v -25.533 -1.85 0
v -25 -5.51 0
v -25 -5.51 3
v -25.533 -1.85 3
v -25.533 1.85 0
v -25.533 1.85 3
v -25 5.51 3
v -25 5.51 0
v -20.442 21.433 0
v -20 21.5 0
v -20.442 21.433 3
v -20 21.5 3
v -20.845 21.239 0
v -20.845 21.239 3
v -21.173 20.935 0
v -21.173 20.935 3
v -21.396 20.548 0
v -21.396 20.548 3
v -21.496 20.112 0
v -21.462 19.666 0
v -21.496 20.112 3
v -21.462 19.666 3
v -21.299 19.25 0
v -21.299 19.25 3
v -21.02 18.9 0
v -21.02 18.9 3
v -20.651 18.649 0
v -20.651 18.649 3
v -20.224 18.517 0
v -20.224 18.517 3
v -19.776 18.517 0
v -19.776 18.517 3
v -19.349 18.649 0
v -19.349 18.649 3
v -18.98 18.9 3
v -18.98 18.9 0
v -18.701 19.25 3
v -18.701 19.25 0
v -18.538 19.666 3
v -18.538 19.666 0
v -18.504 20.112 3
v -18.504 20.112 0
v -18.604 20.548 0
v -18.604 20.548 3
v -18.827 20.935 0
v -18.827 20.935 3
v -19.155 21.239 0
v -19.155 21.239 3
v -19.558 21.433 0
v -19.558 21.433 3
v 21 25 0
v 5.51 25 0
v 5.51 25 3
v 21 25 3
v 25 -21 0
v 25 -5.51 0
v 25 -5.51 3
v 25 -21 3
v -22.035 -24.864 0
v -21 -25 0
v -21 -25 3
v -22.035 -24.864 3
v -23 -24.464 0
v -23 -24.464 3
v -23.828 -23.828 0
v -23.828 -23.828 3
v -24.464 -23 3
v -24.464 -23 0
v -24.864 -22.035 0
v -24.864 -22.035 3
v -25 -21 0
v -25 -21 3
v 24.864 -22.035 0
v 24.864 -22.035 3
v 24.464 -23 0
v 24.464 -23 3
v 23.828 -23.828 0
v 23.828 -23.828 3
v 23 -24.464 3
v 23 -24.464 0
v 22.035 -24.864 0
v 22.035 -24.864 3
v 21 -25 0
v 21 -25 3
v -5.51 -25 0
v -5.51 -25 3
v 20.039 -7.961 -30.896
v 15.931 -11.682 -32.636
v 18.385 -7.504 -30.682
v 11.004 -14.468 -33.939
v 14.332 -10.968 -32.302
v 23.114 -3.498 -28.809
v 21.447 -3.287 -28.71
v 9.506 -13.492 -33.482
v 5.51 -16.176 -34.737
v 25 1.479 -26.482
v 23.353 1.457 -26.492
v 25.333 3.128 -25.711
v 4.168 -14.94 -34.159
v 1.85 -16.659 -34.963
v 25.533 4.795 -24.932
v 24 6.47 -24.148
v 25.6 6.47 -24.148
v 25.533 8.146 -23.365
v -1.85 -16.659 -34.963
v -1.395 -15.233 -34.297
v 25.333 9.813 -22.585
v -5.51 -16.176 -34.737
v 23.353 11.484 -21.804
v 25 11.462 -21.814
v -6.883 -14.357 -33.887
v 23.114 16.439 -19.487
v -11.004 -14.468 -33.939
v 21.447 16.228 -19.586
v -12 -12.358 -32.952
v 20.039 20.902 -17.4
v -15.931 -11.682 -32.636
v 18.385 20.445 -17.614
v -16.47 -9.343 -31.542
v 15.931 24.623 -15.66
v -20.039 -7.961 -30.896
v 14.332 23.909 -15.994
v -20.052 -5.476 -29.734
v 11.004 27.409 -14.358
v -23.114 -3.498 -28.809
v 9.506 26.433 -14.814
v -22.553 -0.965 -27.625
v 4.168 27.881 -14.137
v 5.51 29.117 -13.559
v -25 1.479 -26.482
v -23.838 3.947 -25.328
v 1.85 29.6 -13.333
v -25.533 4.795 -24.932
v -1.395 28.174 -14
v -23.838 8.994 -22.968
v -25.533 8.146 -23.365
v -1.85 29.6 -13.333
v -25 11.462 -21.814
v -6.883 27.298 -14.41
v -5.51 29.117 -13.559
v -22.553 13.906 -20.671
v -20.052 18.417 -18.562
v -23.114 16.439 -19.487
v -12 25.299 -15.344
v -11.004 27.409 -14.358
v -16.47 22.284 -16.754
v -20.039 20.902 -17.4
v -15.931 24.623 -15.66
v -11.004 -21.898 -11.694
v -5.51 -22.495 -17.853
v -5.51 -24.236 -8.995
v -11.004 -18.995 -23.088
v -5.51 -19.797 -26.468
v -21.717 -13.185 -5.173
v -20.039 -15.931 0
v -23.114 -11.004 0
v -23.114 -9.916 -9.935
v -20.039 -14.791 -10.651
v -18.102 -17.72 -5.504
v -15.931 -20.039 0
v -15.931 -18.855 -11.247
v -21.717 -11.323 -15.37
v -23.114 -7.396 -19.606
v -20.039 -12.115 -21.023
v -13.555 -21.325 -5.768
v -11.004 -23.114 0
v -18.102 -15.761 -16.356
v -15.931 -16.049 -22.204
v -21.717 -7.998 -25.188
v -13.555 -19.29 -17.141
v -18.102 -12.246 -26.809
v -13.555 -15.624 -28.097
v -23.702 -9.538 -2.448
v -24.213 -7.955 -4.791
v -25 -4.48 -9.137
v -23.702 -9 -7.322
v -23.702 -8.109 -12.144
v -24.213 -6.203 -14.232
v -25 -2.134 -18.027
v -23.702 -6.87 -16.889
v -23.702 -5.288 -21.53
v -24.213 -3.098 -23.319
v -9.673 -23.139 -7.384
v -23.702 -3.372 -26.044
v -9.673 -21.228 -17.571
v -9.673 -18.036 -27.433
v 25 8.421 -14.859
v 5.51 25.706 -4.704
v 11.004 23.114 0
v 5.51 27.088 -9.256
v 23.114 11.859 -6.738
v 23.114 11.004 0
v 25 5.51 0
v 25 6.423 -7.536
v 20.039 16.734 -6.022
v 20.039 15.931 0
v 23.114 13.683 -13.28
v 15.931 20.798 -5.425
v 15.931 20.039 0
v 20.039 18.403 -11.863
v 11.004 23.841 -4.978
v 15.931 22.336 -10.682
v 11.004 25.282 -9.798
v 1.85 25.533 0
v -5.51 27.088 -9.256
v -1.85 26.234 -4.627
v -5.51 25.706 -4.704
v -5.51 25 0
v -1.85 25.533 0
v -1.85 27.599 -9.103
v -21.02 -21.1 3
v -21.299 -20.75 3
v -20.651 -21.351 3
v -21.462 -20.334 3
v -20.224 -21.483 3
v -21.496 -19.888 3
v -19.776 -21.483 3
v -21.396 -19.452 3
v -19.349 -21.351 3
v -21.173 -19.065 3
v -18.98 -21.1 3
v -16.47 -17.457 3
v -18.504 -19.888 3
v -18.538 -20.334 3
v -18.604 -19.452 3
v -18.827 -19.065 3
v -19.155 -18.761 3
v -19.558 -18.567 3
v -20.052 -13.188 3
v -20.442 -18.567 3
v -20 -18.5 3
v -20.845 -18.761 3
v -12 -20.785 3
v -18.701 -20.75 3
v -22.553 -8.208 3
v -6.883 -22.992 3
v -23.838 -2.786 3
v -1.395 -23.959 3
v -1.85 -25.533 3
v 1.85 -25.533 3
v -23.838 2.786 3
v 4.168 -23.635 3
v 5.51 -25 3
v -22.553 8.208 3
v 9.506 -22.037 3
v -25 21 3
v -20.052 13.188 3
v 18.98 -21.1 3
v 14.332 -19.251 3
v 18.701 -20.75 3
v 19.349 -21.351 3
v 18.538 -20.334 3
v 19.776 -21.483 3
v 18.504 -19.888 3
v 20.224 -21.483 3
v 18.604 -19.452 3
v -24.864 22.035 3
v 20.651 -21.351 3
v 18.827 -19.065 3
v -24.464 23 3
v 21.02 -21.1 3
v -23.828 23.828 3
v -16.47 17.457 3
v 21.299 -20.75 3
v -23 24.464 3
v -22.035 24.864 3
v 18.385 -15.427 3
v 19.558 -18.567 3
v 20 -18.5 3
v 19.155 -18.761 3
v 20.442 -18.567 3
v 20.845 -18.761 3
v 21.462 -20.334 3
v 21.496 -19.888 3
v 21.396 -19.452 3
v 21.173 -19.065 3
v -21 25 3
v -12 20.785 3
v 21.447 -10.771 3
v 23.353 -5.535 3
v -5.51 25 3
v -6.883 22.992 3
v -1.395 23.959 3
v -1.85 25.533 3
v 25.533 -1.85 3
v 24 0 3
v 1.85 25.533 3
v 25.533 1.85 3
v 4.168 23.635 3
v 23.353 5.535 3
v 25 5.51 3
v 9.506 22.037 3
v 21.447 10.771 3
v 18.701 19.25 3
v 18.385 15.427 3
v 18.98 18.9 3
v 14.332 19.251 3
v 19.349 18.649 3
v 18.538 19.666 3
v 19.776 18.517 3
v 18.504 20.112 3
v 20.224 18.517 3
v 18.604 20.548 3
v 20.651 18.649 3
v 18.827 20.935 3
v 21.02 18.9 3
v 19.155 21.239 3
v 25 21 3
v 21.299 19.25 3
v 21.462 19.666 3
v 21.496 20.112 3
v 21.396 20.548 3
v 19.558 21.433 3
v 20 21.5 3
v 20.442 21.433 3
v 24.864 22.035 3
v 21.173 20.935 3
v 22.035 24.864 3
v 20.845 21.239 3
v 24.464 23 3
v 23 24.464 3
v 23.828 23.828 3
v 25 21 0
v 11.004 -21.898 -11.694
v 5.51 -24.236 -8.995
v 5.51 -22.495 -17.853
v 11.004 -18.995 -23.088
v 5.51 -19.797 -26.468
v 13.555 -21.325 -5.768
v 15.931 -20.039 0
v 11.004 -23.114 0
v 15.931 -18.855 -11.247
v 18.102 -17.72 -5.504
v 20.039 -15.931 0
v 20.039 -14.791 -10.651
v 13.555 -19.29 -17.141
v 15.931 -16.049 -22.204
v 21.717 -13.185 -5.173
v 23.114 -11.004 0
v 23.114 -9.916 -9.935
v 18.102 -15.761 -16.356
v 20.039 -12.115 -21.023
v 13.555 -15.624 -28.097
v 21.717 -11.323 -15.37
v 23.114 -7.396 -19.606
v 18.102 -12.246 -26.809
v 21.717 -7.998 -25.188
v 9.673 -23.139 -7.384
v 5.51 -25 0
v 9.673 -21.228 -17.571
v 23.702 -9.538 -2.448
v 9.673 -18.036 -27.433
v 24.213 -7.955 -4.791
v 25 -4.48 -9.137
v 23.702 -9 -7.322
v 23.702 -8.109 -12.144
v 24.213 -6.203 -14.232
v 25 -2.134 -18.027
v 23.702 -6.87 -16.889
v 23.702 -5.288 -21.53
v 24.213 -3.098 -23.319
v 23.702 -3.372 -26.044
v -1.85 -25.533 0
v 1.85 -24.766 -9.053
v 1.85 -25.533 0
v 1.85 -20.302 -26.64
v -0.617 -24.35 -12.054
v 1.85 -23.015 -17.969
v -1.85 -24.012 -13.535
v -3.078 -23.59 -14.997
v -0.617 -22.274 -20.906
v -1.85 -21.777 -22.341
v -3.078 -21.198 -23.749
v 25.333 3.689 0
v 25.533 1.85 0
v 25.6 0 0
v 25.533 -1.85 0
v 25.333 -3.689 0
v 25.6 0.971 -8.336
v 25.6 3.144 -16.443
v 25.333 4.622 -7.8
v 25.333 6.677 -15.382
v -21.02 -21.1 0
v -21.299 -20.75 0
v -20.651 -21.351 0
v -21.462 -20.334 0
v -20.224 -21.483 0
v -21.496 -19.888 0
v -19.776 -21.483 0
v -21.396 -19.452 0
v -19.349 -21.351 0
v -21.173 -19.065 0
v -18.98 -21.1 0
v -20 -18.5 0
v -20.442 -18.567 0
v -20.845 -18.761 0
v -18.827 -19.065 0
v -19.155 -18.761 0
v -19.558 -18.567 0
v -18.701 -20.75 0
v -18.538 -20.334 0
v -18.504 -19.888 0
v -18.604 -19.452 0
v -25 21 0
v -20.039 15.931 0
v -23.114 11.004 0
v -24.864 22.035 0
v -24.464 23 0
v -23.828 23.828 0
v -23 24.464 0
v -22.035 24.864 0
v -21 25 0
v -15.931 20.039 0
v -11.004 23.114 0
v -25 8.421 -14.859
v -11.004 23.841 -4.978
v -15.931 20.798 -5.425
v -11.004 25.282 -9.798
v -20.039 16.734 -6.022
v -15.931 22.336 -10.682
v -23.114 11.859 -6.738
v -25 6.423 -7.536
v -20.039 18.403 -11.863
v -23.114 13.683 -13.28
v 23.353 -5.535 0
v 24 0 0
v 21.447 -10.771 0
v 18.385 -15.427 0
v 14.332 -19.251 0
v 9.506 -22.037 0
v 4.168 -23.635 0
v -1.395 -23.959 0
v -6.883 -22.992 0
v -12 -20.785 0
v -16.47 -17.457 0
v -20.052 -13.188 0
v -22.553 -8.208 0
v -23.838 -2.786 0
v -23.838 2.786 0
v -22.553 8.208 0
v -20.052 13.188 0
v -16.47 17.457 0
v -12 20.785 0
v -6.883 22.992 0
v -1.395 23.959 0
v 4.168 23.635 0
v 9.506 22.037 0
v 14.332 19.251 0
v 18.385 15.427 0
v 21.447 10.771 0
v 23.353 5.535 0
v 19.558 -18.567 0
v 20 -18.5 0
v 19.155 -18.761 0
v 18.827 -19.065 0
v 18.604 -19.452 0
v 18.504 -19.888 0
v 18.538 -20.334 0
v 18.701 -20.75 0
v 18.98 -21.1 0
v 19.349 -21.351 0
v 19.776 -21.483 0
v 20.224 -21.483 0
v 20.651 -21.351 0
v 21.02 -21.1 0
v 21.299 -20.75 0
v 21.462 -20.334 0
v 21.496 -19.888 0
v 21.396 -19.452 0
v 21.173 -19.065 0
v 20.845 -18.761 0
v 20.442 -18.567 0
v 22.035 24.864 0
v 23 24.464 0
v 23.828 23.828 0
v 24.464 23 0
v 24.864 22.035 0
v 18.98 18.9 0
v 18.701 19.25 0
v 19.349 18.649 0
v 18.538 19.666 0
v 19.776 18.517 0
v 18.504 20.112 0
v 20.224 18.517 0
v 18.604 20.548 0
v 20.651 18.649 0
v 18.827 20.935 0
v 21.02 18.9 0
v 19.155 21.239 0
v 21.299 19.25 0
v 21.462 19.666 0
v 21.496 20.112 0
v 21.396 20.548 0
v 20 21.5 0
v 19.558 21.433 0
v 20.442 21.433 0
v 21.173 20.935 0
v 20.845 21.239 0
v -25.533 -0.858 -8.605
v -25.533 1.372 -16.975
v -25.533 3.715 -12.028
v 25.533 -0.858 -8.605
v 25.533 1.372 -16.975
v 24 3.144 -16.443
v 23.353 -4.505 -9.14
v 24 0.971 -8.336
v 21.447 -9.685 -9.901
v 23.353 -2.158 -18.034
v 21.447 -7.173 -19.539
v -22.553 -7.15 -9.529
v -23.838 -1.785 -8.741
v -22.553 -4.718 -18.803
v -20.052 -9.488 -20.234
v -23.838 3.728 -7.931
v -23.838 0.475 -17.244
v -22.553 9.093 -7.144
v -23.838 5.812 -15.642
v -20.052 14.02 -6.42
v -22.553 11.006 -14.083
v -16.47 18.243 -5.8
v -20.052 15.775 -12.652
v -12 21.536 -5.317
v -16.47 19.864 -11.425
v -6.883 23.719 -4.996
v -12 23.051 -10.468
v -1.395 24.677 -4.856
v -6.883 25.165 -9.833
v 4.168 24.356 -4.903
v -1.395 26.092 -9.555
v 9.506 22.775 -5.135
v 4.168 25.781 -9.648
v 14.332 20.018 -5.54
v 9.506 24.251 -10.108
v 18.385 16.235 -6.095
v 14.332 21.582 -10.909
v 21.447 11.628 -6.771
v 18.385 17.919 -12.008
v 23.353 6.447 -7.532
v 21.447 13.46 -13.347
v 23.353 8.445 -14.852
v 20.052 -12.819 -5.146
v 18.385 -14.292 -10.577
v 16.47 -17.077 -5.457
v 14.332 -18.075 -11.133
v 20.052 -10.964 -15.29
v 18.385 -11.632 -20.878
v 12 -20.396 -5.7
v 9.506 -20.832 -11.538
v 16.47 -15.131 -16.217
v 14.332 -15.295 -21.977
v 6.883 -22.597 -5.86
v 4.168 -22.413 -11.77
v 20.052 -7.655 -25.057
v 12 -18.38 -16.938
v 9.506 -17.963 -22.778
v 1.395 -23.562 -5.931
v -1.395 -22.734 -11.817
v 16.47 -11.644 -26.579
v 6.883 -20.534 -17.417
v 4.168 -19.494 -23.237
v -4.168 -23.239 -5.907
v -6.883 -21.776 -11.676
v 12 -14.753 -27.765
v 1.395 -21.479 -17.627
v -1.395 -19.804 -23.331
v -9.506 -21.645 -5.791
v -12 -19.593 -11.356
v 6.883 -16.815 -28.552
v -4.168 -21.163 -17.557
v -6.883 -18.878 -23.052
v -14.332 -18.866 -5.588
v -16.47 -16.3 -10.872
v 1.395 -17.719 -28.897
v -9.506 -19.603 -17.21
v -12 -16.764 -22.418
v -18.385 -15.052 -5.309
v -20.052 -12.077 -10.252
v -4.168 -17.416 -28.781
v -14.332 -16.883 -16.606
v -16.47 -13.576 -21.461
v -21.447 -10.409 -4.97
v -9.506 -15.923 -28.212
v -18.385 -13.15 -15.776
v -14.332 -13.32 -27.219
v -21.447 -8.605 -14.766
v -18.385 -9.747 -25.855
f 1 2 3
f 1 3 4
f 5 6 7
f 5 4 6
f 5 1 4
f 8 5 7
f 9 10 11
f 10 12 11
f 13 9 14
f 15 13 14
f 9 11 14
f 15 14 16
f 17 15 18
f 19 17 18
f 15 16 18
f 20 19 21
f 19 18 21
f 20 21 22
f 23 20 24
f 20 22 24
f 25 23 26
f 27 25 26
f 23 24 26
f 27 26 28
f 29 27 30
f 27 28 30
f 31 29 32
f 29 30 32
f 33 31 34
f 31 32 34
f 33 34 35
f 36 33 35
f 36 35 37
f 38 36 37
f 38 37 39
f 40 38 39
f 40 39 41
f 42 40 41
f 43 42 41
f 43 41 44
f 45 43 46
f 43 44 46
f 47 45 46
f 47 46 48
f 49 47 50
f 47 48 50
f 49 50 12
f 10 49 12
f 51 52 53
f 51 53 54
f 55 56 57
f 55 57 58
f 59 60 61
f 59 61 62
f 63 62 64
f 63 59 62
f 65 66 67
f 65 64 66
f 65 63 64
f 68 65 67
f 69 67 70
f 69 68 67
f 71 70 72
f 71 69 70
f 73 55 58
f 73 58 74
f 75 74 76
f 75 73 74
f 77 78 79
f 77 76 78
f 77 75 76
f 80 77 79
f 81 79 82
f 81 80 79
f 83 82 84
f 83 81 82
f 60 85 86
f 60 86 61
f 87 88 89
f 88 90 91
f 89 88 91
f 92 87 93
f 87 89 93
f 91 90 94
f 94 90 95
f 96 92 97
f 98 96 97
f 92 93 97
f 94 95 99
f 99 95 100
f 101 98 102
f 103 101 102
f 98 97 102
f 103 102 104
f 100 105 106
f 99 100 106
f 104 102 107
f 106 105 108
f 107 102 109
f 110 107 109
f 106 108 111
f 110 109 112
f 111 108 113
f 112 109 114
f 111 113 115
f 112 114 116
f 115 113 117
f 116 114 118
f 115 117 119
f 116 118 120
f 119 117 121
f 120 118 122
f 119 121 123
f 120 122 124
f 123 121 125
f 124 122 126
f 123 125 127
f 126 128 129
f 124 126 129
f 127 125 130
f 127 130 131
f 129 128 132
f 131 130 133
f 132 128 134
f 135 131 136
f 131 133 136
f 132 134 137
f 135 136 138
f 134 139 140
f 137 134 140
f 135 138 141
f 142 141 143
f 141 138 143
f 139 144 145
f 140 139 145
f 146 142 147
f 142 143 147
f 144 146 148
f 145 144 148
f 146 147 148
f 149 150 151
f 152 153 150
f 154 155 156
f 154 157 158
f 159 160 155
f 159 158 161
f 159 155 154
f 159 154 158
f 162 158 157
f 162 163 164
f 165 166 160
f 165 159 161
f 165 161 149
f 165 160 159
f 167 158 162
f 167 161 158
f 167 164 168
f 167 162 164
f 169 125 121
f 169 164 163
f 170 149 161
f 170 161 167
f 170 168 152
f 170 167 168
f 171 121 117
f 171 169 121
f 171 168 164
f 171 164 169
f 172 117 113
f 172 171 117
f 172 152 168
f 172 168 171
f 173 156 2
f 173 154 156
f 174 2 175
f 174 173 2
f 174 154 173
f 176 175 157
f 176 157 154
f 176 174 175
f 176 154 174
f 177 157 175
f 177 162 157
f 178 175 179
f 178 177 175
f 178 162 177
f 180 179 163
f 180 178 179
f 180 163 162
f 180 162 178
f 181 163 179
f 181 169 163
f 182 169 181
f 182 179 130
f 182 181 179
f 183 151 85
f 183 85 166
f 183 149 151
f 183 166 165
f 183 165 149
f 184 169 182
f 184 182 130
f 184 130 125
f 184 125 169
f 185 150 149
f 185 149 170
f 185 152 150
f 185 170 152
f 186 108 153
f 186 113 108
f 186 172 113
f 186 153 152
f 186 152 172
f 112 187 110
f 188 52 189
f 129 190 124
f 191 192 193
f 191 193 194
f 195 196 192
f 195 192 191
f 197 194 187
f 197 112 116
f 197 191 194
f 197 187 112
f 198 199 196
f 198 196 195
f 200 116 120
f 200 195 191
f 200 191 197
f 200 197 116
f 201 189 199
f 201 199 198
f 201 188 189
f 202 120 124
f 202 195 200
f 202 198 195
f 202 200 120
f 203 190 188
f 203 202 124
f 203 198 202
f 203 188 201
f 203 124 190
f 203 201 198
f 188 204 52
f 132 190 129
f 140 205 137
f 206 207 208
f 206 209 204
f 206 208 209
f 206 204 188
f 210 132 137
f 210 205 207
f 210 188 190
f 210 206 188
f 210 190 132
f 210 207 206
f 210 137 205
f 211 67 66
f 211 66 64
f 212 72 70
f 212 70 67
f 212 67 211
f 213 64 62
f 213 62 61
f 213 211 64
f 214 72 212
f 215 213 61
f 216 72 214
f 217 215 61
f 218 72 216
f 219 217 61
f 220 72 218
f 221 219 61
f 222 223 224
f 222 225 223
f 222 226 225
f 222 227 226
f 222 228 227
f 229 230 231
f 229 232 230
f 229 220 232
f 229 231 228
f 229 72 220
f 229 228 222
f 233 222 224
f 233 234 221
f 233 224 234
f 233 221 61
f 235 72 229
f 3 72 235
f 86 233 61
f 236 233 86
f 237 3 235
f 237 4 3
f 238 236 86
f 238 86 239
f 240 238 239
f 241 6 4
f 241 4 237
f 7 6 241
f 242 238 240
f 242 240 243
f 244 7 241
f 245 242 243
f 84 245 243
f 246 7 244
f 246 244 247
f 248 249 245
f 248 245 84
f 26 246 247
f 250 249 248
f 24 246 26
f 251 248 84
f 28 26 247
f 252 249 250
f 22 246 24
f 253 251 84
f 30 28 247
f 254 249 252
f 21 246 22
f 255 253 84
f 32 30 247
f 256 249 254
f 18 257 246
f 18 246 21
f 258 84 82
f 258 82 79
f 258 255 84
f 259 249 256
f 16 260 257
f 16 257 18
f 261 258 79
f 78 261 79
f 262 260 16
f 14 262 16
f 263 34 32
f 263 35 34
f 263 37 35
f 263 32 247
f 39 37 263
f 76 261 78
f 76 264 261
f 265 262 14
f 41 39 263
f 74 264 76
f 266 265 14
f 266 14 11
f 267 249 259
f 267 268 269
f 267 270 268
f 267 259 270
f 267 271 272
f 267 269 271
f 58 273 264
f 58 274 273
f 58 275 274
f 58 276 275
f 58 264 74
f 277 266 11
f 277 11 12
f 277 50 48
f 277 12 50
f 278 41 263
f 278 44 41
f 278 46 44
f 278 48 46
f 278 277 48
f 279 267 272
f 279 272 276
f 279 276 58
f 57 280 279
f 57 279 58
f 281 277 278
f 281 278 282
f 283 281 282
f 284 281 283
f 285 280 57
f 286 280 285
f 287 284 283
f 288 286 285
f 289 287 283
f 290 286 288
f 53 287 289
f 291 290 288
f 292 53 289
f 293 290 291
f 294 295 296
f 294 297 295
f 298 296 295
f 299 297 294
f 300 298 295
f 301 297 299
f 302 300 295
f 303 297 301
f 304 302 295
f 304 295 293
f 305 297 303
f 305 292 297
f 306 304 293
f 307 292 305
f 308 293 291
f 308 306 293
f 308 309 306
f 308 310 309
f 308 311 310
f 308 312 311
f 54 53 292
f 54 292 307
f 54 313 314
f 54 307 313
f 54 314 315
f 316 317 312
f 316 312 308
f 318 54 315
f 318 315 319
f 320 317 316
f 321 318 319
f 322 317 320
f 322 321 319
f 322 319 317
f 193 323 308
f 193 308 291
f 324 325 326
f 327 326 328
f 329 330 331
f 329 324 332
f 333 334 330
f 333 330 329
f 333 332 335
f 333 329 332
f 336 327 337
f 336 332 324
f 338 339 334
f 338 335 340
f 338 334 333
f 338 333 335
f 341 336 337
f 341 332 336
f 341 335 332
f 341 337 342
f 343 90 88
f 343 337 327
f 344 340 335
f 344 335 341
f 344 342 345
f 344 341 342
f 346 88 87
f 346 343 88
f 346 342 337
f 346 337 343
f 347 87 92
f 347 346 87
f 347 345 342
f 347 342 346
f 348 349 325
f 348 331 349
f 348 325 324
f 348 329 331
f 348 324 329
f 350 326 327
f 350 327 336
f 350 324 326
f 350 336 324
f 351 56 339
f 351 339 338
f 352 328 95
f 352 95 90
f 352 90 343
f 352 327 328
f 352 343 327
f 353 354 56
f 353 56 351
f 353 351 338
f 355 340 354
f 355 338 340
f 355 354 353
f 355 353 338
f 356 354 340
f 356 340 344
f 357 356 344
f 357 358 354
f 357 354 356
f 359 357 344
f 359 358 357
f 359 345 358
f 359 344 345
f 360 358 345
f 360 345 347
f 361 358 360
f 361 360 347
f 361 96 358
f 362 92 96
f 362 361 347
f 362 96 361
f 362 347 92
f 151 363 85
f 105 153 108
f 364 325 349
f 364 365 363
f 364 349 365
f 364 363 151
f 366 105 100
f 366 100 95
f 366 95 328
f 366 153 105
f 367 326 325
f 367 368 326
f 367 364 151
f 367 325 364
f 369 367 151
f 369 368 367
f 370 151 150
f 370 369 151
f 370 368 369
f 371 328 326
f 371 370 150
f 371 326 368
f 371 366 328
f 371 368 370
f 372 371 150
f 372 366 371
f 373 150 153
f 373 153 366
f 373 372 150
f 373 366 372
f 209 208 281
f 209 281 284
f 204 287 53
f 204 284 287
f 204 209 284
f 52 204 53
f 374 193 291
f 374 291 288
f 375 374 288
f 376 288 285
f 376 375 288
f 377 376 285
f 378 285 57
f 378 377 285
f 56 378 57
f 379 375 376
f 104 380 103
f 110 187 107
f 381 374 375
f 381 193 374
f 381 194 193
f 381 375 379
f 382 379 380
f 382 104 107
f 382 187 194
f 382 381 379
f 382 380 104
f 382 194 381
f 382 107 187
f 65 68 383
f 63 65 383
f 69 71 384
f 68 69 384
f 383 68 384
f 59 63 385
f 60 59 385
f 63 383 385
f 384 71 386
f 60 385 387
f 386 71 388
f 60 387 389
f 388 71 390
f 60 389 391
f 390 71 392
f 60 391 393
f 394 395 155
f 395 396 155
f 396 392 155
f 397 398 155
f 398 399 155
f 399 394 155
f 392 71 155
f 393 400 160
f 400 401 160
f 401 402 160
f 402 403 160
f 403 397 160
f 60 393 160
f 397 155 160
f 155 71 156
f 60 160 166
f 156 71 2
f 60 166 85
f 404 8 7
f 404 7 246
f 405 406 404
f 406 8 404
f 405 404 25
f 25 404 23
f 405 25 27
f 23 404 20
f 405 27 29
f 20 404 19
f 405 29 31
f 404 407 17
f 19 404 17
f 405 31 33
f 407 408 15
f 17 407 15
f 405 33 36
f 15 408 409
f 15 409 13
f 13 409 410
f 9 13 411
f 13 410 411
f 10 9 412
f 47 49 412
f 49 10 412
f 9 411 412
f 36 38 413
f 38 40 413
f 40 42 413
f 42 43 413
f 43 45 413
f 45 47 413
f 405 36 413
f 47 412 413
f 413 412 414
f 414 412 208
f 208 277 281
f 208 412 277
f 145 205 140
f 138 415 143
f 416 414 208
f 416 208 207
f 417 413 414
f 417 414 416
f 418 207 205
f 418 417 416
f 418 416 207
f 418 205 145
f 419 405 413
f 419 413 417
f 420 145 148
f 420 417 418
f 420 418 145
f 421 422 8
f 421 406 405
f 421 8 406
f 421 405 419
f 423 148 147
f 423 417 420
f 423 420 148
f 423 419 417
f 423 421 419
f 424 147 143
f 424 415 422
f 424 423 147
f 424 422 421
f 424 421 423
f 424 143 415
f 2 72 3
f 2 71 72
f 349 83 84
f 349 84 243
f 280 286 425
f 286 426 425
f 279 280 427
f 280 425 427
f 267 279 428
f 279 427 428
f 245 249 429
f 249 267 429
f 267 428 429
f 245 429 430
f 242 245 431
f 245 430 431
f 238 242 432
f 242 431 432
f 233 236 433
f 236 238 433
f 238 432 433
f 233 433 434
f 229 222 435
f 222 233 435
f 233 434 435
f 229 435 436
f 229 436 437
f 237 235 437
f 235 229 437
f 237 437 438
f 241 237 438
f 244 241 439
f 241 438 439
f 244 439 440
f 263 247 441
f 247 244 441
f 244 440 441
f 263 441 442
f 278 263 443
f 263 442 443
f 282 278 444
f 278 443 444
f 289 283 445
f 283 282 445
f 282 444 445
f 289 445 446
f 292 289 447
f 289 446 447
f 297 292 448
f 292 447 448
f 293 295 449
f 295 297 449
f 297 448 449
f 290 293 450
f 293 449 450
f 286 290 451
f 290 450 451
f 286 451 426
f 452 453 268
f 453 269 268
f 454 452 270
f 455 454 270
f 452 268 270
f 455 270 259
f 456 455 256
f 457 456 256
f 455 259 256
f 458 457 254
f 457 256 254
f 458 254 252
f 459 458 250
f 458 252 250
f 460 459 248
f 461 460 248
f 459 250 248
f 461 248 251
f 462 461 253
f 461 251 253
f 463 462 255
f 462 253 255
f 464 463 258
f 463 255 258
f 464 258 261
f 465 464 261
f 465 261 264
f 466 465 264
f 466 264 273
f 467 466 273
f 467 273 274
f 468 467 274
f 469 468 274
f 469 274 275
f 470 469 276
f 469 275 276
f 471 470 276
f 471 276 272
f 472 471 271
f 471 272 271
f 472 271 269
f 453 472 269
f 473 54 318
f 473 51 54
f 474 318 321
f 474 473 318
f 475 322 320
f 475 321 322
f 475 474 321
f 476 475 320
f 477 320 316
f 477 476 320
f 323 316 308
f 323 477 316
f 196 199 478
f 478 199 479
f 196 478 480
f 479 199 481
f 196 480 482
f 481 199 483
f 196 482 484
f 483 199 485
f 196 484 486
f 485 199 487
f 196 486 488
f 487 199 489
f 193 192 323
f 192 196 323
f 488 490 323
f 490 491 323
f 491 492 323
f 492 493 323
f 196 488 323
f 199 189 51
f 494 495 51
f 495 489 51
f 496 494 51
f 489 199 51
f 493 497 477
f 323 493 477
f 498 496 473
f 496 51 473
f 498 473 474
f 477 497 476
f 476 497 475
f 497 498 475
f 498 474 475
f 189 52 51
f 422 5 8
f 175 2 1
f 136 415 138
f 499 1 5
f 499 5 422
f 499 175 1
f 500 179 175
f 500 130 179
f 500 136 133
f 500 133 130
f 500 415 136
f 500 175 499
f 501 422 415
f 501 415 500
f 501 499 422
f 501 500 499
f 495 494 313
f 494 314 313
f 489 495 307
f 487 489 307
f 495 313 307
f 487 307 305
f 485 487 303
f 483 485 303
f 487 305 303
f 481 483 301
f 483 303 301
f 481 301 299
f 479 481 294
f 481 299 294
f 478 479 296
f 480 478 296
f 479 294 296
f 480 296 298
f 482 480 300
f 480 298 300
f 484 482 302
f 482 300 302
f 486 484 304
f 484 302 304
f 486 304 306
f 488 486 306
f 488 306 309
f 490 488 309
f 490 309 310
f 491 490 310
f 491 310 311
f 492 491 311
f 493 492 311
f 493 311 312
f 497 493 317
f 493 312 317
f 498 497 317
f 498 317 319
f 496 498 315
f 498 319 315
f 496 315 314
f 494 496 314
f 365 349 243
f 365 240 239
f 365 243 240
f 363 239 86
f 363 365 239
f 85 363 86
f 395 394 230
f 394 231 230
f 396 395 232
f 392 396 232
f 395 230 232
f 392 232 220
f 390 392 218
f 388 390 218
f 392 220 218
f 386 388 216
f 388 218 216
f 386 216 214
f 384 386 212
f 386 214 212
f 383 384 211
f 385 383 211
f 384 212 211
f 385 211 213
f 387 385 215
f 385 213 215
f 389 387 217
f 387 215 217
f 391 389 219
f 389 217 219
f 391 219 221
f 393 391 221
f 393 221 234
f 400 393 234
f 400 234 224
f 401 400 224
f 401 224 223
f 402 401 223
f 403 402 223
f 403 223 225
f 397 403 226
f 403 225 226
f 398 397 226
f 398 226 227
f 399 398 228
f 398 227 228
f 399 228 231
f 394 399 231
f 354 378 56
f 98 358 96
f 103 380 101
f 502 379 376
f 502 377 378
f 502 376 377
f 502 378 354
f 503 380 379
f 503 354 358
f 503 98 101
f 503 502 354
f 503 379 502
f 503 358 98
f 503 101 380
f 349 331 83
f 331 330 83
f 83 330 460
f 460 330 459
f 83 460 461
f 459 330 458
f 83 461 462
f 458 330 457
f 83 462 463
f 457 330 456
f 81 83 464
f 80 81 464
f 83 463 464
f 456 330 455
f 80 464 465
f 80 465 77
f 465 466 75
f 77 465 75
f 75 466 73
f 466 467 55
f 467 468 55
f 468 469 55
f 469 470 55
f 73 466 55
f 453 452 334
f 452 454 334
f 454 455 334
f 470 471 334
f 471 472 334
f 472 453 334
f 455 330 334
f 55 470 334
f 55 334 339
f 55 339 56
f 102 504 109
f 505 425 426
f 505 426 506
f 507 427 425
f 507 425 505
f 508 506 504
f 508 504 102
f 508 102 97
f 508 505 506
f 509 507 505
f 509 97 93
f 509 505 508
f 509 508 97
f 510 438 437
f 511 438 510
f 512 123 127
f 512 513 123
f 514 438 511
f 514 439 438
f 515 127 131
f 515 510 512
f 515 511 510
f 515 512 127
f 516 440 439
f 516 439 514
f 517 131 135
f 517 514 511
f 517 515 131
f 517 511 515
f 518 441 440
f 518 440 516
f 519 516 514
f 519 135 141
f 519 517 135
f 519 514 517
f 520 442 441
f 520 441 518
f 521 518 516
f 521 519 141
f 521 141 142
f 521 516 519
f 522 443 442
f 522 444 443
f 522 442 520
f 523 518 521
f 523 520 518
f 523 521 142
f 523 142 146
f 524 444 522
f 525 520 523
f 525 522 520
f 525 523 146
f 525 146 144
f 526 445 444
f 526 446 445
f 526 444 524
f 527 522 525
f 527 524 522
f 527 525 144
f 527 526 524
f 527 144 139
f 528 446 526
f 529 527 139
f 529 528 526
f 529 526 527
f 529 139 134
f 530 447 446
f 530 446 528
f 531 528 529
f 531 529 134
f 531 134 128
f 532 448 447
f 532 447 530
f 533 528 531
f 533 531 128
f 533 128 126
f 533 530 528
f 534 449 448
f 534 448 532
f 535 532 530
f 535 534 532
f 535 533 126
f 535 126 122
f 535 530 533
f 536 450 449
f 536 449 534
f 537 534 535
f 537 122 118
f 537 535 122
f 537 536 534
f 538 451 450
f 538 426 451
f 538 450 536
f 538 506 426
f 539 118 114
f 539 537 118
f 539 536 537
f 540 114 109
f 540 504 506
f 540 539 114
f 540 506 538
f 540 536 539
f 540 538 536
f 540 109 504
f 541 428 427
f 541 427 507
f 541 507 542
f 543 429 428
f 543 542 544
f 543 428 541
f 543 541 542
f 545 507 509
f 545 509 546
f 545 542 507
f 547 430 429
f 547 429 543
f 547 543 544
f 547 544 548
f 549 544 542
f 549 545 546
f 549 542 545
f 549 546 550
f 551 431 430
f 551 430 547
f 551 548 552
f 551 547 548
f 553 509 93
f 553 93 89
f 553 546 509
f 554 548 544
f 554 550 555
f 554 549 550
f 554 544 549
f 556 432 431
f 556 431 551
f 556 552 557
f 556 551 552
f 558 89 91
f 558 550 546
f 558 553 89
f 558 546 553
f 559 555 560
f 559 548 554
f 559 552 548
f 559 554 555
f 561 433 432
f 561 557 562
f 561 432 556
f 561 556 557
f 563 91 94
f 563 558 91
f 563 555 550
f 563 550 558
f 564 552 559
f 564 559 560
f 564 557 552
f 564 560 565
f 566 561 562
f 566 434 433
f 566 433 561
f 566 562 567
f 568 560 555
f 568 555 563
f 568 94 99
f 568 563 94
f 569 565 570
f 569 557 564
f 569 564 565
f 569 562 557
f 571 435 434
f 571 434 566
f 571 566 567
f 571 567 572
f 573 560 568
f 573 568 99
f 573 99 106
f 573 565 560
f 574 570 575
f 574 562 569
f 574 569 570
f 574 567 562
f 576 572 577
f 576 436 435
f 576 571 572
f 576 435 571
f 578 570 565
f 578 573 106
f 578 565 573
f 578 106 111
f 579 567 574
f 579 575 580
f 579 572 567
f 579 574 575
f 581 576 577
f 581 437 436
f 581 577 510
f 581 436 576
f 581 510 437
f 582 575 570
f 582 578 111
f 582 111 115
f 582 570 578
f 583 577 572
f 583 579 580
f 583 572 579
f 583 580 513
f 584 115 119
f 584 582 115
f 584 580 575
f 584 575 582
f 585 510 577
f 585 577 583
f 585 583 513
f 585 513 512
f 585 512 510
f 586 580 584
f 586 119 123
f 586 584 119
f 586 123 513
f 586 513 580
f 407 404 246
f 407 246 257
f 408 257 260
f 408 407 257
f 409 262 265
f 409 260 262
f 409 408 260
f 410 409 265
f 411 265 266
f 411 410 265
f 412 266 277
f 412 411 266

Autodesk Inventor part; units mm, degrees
ref_plane "YZ Plane" through (0, 0, 0) normal (1, 0, 0) x (0, 1, 0)
ref_plane "XZ Plane" through (0, 0, 0) normal (0, 1, 0) x (-1, 0, 0)
ref_plane "XY Plane" through (0, 0, 0) normal (0, 0, 1) x (1, 0, 0)
sketch "Szkic1" plane through (0, 0, 0) normal (0, 0, 1) x (1, 0, 0)
  circle A0 centre (0, 0) radius 24
  circle A1 centre (0, 0) radius 25.6
  line L0 (-21, 25) -> (-5.51, 25)
  line L1 (5.51, 25) -> (21, 25)
  line L2 (-25, -21) -> (-25, -5.51)
  line L3 (-25, 5.51) -> (-25, 21)
  line L4 (25, 21) -> (25, 5.51)
  line L5 (25, -5.51) -> (25, -21)
  line L6 (21, -25) -> (5.51, -25)
  line L7 (-5.51, -25) -> (-21, -25)
  arc A2 (-21, 25) -> (-25, 21) centre (-21, 21) ccw
  arc A3 (25, 21) -> (21, 25) centre (21, 21) ccw
  arc A4 (21, -25) -> (25, -21) centre (21, -21) ccw
  arc A5 (-25, -21) -> (-21, -25) centre (-21, -21) ccw
  point P0 (-25, 25)
  point P1 (25, -25)
  point P2 (25, 25)
  point P3 (-20, 20)
  point P4 (20, 20)
  point P5 (-20, -20)
  point P6 (20, -20)
  dimension "d0" = 48
  dimension "d1" = 50
  dimension "d2" = 50
  dimension "d5" = 40
  dimension "d6" = 40
  dimension "d7" = 20
  dimension "d8" = 20
  dimension "d9" = 1.6
  dimension "d10" = 4
sketch "Szkic2" plane through (0, 0, 0) normal (1, 0, 0) x (0, 1, 0)
  arc A0 (0, 0) -> (6.4705, -24.1481) centre (57.5642, 2.4833) ccw
  line L0 (0, 0) -> (6.4705, -24.1481) construction
  line L1 (0, 0) -> (25, 0) construction
  dimension "d11" = 25
  dimension "d12" = 75
sweep "Przeciągnięcie1" add profiles "Szkic1" path "Szkic2" contours A1
extrude "Wyciągnięcie proste1" add sketch "Szkic1" along normal blind 3
hole "Otwór1" at (-20, 20, 0) at (20, 20, 0) at (-20, -20, 0) at (20, -20, 0) direction (0, 0, 1) diameter 3 end through all
properties part number "3DP_ABS_Electronics_Colling_Tunnel"
